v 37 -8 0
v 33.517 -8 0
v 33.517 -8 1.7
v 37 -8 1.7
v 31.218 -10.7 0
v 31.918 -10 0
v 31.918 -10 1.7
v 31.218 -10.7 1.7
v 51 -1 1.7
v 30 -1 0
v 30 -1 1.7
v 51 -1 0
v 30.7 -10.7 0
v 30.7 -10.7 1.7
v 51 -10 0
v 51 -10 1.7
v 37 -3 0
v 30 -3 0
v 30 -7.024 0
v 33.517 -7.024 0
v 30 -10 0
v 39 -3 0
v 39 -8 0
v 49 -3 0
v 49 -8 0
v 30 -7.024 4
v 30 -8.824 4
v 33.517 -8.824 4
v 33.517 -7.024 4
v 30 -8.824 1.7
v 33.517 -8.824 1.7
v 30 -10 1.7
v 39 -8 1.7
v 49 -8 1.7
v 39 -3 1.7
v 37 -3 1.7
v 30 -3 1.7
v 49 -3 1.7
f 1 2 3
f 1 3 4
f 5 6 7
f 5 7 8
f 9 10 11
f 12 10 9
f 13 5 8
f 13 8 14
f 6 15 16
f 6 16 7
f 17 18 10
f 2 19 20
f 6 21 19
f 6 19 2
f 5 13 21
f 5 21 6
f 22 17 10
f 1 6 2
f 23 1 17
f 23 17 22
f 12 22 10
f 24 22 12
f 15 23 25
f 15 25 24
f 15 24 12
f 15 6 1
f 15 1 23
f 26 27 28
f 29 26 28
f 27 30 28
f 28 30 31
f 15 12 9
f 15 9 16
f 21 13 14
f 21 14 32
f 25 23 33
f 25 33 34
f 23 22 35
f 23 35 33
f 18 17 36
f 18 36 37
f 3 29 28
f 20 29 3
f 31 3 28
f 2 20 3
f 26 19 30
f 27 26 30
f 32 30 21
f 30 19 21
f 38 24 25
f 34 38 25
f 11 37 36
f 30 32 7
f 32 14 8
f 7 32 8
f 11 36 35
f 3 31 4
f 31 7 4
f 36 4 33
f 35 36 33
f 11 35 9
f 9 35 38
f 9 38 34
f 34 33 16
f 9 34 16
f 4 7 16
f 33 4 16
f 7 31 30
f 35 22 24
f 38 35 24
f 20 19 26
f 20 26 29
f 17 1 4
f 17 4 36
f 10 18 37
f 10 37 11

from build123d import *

# Parameters (mm, degrees)
SKETCH061_W                    = 10
SKETCH061_H                    = 5
PAD017_DEPTH                   = 1.7
SKETCH062_W                    = 3.516788
SKETCH062_H                    = 1.8
PAD018_DEPTH                   = 4
PART_MIRRORING_PLACEMENT_ANGLE = 180


with BuildPart() as filterpapierklemmer_mirrored:
    # Sketch061 → Pad017 (new body)
    with BuildSketch(Plane.XY):
        Polygon((30, 0), (51, 0), (51, 9), (31.917717, 9), (31.217717, 9.7), (30.7, 9.7), (30, 9), (30, 7), (37, 7), (37, 2), (30, 2), align=None)
        with Locations((44, 4.5)):
            Rectangle(SKETCH061_W, SKETCH061_H, mode=Mode.SUBTRACT)
    extrude(amount=PAD017_DEPTH)

    # Sketch062 → Pad018 (join)
    with BuildSketch(Plane.XY):
        with Locations((31.758394, 6.923936)):
            Rectangle(SKETCH062_W, SKETCH062_H)
    extrude(amount=PAD018_DEPTH)


with BuildPart() as filterpapierklemmer_mirrored_petg:
    # Part__Mirroring: instance of filterpapierklemmer_mirrored
    add(filterpapierklemmer_mirrored.part.mirror(Plane(origin=(0, 0, 0), x_dir=(0, 1, 0), z_dir=(0, 0, 1))))


with BuildPart() as filterpapierklemmer_mirrored_petg_1:
    # Part__Mirroring placement: moved
    add(filterpapierklemmer_mirrored_petg.part.moved(Location((0, -1, 0))).rotate(Axis((0, -1, 0), (1, 0, 0)), PART_MIRRORING_PLACEMENT_ANGLE))


solid = filterpapierklemmer_mirrored_petg_1.part
